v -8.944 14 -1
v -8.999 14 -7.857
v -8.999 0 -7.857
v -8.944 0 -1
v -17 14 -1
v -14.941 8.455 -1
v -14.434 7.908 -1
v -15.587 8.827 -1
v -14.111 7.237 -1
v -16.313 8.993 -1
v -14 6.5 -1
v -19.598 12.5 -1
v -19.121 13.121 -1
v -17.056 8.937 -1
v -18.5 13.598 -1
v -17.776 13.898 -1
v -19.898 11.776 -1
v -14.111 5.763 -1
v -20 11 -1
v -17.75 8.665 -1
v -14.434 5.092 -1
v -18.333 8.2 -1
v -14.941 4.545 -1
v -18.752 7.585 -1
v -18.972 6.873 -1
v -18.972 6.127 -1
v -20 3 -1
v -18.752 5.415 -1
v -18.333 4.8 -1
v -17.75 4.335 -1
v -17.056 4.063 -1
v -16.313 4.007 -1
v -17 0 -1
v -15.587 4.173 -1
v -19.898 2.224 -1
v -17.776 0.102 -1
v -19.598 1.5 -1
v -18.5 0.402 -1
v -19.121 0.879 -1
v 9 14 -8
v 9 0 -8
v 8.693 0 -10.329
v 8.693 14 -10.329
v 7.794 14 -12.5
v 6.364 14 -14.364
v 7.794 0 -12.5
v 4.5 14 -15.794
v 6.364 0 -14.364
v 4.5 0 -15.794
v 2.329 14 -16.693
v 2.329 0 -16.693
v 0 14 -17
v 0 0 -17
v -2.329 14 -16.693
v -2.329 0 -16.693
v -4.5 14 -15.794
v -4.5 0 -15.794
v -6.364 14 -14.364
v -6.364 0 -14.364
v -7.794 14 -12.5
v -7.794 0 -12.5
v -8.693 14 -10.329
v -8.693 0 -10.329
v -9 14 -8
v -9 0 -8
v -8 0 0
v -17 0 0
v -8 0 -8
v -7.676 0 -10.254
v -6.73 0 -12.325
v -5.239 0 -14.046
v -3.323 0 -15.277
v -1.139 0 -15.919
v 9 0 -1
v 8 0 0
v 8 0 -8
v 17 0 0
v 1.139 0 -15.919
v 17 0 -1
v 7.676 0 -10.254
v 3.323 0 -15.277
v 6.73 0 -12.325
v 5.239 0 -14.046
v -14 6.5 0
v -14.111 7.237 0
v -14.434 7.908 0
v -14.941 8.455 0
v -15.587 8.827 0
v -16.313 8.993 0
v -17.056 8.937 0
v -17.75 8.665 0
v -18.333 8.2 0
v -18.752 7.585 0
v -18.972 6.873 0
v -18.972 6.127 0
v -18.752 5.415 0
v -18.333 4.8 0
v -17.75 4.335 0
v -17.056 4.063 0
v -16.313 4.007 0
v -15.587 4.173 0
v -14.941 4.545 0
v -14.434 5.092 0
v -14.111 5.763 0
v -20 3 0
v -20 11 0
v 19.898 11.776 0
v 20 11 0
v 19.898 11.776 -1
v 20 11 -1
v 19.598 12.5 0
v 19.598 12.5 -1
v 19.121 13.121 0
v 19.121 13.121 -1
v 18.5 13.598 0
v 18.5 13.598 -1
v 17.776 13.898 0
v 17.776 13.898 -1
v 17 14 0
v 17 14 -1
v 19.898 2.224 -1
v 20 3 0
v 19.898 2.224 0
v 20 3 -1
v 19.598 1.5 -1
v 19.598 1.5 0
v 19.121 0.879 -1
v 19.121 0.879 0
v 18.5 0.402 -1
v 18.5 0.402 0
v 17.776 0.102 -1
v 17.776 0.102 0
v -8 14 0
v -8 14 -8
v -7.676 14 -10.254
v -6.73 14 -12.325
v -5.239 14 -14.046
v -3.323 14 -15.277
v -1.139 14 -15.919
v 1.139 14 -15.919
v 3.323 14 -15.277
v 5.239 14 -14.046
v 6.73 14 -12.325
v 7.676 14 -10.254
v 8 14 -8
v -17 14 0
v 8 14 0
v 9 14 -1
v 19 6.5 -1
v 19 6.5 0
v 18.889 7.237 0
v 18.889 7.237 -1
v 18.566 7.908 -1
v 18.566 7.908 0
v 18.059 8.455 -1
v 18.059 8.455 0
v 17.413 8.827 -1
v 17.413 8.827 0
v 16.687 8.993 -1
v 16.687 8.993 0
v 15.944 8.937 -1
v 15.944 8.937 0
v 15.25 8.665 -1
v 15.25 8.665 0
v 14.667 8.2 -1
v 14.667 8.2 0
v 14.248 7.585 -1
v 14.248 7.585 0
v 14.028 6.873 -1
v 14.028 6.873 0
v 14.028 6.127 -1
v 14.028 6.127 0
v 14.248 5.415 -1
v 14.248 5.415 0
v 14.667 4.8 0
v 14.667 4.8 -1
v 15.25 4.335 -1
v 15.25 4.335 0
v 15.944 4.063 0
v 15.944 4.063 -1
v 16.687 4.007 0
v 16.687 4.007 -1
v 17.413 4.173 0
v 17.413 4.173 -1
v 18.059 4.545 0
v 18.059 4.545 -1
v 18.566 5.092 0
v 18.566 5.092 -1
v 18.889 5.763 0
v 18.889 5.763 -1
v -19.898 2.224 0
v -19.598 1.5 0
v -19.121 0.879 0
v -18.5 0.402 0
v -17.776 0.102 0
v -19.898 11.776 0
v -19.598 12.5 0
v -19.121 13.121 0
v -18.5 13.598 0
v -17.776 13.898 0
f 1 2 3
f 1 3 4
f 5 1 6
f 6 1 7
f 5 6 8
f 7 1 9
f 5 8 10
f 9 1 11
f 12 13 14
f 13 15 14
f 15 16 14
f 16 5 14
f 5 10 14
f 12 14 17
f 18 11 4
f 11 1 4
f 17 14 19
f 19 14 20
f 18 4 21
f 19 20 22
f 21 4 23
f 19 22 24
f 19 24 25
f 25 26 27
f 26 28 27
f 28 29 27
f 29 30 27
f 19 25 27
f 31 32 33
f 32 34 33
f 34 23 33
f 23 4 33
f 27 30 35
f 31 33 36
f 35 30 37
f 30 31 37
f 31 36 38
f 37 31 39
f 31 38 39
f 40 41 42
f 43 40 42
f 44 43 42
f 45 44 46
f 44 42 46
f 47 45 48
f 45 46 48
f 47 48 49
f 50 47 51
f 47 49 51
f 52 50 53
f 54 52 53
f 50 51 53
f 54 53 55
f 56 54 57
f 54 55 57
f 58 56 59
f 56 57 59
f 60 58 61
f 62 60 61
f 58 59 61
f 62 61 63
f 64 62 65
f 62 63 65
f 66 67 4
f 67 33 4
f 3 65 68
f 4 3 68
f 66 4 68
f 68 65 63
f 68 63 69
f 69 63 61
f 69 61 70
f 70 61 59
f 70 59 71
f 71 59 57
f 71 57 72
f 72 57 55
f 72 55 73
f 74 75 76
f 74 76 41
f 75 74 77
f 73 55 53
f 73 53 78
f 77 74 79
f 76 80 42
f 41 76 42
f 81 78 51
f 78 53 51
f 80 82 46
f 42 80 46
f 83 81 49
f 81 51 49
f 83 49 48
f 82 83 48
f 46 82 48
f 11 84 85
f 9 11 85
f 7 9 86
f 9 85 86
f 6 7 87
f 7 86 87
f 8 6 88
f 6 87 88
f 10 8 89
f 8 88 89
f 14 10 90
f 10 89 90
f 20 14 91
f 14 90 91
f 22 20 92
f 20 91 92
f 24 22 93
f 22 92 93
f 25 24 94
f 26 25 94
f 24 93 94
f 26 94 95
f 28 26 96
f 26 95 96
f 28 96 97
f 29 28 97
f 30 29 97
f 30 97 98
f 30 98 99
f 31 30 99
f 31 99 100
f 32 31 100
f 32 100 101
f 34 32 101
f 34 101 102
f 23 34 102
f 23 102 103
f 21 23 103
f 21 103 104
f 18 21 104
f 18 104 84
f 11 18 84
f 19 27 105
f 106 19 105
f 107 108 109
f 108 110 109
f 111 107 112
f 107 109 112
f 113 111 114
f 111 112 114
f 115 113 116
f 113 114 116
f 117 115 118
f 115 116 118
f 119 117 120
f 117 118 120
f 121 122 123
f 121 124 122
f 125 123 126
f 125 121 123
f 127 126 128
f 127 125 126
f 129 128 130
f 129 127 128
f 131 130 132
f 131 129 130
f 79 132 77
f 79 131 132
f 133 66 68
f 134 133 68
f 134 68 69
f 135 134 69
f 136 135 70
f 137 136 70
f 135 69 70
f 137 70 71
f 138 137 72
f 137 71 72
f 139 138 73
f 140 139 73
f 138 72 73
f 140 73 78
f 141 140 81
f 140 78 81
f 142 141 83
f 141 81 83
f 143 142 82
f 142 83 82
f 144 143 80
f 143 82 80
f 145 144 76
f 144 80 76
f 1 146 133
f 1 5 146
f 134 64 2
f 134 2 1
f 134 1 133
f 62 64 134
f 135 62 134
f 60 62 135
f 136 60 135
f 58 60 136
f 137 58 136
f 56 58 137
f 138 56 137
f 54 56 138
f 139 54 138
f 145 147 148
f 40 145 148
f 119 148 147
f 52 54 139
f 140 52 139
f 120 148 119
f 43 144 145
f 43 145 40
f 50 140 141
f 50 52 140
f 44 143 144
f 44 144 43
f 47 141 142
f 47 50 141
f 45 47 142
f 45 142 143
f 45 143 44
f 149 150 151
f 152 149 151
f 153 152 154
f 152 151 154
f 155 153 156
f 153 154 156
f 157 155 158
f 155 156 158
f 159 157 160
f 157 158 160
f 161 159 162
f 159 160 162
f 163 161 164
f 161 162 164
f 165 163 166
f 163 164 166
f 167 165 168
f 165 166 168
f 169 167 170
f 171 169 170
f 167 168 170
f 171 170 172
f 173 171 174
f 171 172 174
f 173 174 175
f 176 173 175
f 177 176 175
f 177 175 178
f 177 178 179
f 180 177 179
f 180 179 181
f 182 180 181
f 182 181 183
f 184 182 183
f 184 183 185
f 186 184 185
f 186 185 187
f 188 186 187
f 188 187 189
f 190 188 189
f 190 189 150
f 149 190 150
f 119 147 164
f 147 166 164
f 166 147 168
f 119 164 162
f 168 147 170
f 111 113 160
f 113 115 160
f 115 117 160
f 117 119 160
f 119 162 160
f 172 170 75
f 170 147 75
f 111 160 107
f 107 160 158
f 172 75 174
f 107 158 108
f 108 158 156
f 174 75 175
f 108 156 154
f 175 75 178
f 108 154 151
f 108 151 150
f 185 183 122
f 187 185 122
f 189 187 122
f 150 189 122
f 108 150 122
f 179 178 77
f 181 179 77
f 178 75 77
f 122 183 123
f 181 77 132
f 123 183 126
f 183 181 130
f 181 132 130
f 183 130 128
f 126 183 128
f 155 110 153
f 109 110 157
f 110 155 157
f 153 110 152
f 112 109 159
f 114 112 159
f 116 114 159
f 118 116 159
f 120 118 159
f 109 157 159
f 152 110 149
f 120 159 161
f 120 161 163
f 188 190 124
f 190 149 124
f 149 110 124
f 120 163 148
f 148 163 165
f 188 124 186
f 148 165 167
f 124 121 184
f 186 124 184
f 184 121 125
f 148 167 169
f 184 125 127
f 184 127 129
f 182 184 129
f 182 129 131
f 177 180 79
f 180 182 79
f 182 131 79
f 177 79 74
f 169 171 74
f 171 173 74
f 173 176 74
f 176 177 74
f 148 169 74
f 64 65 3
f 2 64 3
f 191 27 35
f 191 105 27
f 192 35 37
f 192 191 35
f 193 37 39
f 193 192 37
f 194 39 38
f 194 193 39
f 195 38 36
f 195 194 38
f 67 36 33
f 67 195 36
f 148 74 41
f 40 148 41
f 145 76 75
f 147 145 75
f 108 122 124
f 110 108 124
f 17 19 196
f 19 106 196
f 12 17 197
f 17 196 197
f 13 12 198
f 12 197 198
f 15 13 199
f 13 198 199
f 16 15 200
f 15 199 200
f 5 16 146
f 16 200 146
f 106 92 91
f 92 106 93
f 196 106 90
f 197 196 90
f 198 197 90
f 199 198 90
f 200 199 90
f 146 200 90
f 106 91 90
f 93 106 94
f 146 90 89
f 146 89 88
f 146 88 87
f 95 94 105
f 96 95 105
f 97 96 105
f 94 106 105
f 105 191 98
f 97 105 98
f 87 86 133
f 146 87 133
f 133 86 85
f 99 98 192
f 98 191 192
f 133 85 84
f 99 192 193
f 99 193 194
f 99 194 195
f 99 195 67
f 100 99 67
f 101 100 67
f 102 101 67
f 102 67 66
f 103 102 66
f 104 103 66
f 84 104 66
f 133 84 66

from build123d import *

# Parameters (mm, degrees)
SALIENTE_EXTRUIR1_DEPTH = 14
REDONDEO1_R             = 3
CROQUIS2_R              = 2.5
CORTAR_EXTRUIR1_DEPTH   = 10


with BuildPart() as part:
    # Croquis1 → Saliente-Extruir1 (new body)
    with BuildSketch(Plane(origin=(0, 0, 0), x_dir=(1, 0, 0), z_dir=(0, 1, 0))):
        with BuildLine():
            Line((-20, 0), (-8, 0))
            Line((-8, 0), (-8, 8))
            ThreePointArc((-8, 8), (0, 16), (8, 8))
            Line((8, 8), (8, 0))
            Line((8, 0), (20, 0))
            Line((20, 0), (20, 1))
            Line((20, 1), (9, 1))
            Line((9, 1), (9, 8))
            ThreePointArc((9, 8), (0, 17), (-9, 8))
            Line((-9, 8), (-8.998859232, 7.856708279))
            Line((-8.998859232, 7.856708279), (-8.94427191, 1))
            Line((-8.94427191, 1), (-20, 1))
            Line((-20, 1), (-20, 0))
        make_face()
    extrude(amount=SALIENTE_EXTRUIR1_DEPTH)

    # Redondeo1
    redondeo1_edges = [part.edges().sort_by_distance(p)[0] for p in [
        (-20, 0, -0.5),
        (20, 0, -0.5),
        (20, 14, -0.5),
        (-20, 14, -0.5),
    ]]
    fillet(redondeo1_edges, radius=REDONDEO1_R)

    # Croquis2 → Cortar-Extruir1 (cut)
    with BuildSketch(Plane.XY):
        with Locations((-16.5, 6.5)):
            Circle(CROQUIS2_R)
        with Locations((16.5, 6.5)):
            Circle(CROQUIS2_R)
    extrude(amount=-CORTAR_EXTRUIR1_DEPTH, mode=Mode.SUBTRACT)


solid = part.part
